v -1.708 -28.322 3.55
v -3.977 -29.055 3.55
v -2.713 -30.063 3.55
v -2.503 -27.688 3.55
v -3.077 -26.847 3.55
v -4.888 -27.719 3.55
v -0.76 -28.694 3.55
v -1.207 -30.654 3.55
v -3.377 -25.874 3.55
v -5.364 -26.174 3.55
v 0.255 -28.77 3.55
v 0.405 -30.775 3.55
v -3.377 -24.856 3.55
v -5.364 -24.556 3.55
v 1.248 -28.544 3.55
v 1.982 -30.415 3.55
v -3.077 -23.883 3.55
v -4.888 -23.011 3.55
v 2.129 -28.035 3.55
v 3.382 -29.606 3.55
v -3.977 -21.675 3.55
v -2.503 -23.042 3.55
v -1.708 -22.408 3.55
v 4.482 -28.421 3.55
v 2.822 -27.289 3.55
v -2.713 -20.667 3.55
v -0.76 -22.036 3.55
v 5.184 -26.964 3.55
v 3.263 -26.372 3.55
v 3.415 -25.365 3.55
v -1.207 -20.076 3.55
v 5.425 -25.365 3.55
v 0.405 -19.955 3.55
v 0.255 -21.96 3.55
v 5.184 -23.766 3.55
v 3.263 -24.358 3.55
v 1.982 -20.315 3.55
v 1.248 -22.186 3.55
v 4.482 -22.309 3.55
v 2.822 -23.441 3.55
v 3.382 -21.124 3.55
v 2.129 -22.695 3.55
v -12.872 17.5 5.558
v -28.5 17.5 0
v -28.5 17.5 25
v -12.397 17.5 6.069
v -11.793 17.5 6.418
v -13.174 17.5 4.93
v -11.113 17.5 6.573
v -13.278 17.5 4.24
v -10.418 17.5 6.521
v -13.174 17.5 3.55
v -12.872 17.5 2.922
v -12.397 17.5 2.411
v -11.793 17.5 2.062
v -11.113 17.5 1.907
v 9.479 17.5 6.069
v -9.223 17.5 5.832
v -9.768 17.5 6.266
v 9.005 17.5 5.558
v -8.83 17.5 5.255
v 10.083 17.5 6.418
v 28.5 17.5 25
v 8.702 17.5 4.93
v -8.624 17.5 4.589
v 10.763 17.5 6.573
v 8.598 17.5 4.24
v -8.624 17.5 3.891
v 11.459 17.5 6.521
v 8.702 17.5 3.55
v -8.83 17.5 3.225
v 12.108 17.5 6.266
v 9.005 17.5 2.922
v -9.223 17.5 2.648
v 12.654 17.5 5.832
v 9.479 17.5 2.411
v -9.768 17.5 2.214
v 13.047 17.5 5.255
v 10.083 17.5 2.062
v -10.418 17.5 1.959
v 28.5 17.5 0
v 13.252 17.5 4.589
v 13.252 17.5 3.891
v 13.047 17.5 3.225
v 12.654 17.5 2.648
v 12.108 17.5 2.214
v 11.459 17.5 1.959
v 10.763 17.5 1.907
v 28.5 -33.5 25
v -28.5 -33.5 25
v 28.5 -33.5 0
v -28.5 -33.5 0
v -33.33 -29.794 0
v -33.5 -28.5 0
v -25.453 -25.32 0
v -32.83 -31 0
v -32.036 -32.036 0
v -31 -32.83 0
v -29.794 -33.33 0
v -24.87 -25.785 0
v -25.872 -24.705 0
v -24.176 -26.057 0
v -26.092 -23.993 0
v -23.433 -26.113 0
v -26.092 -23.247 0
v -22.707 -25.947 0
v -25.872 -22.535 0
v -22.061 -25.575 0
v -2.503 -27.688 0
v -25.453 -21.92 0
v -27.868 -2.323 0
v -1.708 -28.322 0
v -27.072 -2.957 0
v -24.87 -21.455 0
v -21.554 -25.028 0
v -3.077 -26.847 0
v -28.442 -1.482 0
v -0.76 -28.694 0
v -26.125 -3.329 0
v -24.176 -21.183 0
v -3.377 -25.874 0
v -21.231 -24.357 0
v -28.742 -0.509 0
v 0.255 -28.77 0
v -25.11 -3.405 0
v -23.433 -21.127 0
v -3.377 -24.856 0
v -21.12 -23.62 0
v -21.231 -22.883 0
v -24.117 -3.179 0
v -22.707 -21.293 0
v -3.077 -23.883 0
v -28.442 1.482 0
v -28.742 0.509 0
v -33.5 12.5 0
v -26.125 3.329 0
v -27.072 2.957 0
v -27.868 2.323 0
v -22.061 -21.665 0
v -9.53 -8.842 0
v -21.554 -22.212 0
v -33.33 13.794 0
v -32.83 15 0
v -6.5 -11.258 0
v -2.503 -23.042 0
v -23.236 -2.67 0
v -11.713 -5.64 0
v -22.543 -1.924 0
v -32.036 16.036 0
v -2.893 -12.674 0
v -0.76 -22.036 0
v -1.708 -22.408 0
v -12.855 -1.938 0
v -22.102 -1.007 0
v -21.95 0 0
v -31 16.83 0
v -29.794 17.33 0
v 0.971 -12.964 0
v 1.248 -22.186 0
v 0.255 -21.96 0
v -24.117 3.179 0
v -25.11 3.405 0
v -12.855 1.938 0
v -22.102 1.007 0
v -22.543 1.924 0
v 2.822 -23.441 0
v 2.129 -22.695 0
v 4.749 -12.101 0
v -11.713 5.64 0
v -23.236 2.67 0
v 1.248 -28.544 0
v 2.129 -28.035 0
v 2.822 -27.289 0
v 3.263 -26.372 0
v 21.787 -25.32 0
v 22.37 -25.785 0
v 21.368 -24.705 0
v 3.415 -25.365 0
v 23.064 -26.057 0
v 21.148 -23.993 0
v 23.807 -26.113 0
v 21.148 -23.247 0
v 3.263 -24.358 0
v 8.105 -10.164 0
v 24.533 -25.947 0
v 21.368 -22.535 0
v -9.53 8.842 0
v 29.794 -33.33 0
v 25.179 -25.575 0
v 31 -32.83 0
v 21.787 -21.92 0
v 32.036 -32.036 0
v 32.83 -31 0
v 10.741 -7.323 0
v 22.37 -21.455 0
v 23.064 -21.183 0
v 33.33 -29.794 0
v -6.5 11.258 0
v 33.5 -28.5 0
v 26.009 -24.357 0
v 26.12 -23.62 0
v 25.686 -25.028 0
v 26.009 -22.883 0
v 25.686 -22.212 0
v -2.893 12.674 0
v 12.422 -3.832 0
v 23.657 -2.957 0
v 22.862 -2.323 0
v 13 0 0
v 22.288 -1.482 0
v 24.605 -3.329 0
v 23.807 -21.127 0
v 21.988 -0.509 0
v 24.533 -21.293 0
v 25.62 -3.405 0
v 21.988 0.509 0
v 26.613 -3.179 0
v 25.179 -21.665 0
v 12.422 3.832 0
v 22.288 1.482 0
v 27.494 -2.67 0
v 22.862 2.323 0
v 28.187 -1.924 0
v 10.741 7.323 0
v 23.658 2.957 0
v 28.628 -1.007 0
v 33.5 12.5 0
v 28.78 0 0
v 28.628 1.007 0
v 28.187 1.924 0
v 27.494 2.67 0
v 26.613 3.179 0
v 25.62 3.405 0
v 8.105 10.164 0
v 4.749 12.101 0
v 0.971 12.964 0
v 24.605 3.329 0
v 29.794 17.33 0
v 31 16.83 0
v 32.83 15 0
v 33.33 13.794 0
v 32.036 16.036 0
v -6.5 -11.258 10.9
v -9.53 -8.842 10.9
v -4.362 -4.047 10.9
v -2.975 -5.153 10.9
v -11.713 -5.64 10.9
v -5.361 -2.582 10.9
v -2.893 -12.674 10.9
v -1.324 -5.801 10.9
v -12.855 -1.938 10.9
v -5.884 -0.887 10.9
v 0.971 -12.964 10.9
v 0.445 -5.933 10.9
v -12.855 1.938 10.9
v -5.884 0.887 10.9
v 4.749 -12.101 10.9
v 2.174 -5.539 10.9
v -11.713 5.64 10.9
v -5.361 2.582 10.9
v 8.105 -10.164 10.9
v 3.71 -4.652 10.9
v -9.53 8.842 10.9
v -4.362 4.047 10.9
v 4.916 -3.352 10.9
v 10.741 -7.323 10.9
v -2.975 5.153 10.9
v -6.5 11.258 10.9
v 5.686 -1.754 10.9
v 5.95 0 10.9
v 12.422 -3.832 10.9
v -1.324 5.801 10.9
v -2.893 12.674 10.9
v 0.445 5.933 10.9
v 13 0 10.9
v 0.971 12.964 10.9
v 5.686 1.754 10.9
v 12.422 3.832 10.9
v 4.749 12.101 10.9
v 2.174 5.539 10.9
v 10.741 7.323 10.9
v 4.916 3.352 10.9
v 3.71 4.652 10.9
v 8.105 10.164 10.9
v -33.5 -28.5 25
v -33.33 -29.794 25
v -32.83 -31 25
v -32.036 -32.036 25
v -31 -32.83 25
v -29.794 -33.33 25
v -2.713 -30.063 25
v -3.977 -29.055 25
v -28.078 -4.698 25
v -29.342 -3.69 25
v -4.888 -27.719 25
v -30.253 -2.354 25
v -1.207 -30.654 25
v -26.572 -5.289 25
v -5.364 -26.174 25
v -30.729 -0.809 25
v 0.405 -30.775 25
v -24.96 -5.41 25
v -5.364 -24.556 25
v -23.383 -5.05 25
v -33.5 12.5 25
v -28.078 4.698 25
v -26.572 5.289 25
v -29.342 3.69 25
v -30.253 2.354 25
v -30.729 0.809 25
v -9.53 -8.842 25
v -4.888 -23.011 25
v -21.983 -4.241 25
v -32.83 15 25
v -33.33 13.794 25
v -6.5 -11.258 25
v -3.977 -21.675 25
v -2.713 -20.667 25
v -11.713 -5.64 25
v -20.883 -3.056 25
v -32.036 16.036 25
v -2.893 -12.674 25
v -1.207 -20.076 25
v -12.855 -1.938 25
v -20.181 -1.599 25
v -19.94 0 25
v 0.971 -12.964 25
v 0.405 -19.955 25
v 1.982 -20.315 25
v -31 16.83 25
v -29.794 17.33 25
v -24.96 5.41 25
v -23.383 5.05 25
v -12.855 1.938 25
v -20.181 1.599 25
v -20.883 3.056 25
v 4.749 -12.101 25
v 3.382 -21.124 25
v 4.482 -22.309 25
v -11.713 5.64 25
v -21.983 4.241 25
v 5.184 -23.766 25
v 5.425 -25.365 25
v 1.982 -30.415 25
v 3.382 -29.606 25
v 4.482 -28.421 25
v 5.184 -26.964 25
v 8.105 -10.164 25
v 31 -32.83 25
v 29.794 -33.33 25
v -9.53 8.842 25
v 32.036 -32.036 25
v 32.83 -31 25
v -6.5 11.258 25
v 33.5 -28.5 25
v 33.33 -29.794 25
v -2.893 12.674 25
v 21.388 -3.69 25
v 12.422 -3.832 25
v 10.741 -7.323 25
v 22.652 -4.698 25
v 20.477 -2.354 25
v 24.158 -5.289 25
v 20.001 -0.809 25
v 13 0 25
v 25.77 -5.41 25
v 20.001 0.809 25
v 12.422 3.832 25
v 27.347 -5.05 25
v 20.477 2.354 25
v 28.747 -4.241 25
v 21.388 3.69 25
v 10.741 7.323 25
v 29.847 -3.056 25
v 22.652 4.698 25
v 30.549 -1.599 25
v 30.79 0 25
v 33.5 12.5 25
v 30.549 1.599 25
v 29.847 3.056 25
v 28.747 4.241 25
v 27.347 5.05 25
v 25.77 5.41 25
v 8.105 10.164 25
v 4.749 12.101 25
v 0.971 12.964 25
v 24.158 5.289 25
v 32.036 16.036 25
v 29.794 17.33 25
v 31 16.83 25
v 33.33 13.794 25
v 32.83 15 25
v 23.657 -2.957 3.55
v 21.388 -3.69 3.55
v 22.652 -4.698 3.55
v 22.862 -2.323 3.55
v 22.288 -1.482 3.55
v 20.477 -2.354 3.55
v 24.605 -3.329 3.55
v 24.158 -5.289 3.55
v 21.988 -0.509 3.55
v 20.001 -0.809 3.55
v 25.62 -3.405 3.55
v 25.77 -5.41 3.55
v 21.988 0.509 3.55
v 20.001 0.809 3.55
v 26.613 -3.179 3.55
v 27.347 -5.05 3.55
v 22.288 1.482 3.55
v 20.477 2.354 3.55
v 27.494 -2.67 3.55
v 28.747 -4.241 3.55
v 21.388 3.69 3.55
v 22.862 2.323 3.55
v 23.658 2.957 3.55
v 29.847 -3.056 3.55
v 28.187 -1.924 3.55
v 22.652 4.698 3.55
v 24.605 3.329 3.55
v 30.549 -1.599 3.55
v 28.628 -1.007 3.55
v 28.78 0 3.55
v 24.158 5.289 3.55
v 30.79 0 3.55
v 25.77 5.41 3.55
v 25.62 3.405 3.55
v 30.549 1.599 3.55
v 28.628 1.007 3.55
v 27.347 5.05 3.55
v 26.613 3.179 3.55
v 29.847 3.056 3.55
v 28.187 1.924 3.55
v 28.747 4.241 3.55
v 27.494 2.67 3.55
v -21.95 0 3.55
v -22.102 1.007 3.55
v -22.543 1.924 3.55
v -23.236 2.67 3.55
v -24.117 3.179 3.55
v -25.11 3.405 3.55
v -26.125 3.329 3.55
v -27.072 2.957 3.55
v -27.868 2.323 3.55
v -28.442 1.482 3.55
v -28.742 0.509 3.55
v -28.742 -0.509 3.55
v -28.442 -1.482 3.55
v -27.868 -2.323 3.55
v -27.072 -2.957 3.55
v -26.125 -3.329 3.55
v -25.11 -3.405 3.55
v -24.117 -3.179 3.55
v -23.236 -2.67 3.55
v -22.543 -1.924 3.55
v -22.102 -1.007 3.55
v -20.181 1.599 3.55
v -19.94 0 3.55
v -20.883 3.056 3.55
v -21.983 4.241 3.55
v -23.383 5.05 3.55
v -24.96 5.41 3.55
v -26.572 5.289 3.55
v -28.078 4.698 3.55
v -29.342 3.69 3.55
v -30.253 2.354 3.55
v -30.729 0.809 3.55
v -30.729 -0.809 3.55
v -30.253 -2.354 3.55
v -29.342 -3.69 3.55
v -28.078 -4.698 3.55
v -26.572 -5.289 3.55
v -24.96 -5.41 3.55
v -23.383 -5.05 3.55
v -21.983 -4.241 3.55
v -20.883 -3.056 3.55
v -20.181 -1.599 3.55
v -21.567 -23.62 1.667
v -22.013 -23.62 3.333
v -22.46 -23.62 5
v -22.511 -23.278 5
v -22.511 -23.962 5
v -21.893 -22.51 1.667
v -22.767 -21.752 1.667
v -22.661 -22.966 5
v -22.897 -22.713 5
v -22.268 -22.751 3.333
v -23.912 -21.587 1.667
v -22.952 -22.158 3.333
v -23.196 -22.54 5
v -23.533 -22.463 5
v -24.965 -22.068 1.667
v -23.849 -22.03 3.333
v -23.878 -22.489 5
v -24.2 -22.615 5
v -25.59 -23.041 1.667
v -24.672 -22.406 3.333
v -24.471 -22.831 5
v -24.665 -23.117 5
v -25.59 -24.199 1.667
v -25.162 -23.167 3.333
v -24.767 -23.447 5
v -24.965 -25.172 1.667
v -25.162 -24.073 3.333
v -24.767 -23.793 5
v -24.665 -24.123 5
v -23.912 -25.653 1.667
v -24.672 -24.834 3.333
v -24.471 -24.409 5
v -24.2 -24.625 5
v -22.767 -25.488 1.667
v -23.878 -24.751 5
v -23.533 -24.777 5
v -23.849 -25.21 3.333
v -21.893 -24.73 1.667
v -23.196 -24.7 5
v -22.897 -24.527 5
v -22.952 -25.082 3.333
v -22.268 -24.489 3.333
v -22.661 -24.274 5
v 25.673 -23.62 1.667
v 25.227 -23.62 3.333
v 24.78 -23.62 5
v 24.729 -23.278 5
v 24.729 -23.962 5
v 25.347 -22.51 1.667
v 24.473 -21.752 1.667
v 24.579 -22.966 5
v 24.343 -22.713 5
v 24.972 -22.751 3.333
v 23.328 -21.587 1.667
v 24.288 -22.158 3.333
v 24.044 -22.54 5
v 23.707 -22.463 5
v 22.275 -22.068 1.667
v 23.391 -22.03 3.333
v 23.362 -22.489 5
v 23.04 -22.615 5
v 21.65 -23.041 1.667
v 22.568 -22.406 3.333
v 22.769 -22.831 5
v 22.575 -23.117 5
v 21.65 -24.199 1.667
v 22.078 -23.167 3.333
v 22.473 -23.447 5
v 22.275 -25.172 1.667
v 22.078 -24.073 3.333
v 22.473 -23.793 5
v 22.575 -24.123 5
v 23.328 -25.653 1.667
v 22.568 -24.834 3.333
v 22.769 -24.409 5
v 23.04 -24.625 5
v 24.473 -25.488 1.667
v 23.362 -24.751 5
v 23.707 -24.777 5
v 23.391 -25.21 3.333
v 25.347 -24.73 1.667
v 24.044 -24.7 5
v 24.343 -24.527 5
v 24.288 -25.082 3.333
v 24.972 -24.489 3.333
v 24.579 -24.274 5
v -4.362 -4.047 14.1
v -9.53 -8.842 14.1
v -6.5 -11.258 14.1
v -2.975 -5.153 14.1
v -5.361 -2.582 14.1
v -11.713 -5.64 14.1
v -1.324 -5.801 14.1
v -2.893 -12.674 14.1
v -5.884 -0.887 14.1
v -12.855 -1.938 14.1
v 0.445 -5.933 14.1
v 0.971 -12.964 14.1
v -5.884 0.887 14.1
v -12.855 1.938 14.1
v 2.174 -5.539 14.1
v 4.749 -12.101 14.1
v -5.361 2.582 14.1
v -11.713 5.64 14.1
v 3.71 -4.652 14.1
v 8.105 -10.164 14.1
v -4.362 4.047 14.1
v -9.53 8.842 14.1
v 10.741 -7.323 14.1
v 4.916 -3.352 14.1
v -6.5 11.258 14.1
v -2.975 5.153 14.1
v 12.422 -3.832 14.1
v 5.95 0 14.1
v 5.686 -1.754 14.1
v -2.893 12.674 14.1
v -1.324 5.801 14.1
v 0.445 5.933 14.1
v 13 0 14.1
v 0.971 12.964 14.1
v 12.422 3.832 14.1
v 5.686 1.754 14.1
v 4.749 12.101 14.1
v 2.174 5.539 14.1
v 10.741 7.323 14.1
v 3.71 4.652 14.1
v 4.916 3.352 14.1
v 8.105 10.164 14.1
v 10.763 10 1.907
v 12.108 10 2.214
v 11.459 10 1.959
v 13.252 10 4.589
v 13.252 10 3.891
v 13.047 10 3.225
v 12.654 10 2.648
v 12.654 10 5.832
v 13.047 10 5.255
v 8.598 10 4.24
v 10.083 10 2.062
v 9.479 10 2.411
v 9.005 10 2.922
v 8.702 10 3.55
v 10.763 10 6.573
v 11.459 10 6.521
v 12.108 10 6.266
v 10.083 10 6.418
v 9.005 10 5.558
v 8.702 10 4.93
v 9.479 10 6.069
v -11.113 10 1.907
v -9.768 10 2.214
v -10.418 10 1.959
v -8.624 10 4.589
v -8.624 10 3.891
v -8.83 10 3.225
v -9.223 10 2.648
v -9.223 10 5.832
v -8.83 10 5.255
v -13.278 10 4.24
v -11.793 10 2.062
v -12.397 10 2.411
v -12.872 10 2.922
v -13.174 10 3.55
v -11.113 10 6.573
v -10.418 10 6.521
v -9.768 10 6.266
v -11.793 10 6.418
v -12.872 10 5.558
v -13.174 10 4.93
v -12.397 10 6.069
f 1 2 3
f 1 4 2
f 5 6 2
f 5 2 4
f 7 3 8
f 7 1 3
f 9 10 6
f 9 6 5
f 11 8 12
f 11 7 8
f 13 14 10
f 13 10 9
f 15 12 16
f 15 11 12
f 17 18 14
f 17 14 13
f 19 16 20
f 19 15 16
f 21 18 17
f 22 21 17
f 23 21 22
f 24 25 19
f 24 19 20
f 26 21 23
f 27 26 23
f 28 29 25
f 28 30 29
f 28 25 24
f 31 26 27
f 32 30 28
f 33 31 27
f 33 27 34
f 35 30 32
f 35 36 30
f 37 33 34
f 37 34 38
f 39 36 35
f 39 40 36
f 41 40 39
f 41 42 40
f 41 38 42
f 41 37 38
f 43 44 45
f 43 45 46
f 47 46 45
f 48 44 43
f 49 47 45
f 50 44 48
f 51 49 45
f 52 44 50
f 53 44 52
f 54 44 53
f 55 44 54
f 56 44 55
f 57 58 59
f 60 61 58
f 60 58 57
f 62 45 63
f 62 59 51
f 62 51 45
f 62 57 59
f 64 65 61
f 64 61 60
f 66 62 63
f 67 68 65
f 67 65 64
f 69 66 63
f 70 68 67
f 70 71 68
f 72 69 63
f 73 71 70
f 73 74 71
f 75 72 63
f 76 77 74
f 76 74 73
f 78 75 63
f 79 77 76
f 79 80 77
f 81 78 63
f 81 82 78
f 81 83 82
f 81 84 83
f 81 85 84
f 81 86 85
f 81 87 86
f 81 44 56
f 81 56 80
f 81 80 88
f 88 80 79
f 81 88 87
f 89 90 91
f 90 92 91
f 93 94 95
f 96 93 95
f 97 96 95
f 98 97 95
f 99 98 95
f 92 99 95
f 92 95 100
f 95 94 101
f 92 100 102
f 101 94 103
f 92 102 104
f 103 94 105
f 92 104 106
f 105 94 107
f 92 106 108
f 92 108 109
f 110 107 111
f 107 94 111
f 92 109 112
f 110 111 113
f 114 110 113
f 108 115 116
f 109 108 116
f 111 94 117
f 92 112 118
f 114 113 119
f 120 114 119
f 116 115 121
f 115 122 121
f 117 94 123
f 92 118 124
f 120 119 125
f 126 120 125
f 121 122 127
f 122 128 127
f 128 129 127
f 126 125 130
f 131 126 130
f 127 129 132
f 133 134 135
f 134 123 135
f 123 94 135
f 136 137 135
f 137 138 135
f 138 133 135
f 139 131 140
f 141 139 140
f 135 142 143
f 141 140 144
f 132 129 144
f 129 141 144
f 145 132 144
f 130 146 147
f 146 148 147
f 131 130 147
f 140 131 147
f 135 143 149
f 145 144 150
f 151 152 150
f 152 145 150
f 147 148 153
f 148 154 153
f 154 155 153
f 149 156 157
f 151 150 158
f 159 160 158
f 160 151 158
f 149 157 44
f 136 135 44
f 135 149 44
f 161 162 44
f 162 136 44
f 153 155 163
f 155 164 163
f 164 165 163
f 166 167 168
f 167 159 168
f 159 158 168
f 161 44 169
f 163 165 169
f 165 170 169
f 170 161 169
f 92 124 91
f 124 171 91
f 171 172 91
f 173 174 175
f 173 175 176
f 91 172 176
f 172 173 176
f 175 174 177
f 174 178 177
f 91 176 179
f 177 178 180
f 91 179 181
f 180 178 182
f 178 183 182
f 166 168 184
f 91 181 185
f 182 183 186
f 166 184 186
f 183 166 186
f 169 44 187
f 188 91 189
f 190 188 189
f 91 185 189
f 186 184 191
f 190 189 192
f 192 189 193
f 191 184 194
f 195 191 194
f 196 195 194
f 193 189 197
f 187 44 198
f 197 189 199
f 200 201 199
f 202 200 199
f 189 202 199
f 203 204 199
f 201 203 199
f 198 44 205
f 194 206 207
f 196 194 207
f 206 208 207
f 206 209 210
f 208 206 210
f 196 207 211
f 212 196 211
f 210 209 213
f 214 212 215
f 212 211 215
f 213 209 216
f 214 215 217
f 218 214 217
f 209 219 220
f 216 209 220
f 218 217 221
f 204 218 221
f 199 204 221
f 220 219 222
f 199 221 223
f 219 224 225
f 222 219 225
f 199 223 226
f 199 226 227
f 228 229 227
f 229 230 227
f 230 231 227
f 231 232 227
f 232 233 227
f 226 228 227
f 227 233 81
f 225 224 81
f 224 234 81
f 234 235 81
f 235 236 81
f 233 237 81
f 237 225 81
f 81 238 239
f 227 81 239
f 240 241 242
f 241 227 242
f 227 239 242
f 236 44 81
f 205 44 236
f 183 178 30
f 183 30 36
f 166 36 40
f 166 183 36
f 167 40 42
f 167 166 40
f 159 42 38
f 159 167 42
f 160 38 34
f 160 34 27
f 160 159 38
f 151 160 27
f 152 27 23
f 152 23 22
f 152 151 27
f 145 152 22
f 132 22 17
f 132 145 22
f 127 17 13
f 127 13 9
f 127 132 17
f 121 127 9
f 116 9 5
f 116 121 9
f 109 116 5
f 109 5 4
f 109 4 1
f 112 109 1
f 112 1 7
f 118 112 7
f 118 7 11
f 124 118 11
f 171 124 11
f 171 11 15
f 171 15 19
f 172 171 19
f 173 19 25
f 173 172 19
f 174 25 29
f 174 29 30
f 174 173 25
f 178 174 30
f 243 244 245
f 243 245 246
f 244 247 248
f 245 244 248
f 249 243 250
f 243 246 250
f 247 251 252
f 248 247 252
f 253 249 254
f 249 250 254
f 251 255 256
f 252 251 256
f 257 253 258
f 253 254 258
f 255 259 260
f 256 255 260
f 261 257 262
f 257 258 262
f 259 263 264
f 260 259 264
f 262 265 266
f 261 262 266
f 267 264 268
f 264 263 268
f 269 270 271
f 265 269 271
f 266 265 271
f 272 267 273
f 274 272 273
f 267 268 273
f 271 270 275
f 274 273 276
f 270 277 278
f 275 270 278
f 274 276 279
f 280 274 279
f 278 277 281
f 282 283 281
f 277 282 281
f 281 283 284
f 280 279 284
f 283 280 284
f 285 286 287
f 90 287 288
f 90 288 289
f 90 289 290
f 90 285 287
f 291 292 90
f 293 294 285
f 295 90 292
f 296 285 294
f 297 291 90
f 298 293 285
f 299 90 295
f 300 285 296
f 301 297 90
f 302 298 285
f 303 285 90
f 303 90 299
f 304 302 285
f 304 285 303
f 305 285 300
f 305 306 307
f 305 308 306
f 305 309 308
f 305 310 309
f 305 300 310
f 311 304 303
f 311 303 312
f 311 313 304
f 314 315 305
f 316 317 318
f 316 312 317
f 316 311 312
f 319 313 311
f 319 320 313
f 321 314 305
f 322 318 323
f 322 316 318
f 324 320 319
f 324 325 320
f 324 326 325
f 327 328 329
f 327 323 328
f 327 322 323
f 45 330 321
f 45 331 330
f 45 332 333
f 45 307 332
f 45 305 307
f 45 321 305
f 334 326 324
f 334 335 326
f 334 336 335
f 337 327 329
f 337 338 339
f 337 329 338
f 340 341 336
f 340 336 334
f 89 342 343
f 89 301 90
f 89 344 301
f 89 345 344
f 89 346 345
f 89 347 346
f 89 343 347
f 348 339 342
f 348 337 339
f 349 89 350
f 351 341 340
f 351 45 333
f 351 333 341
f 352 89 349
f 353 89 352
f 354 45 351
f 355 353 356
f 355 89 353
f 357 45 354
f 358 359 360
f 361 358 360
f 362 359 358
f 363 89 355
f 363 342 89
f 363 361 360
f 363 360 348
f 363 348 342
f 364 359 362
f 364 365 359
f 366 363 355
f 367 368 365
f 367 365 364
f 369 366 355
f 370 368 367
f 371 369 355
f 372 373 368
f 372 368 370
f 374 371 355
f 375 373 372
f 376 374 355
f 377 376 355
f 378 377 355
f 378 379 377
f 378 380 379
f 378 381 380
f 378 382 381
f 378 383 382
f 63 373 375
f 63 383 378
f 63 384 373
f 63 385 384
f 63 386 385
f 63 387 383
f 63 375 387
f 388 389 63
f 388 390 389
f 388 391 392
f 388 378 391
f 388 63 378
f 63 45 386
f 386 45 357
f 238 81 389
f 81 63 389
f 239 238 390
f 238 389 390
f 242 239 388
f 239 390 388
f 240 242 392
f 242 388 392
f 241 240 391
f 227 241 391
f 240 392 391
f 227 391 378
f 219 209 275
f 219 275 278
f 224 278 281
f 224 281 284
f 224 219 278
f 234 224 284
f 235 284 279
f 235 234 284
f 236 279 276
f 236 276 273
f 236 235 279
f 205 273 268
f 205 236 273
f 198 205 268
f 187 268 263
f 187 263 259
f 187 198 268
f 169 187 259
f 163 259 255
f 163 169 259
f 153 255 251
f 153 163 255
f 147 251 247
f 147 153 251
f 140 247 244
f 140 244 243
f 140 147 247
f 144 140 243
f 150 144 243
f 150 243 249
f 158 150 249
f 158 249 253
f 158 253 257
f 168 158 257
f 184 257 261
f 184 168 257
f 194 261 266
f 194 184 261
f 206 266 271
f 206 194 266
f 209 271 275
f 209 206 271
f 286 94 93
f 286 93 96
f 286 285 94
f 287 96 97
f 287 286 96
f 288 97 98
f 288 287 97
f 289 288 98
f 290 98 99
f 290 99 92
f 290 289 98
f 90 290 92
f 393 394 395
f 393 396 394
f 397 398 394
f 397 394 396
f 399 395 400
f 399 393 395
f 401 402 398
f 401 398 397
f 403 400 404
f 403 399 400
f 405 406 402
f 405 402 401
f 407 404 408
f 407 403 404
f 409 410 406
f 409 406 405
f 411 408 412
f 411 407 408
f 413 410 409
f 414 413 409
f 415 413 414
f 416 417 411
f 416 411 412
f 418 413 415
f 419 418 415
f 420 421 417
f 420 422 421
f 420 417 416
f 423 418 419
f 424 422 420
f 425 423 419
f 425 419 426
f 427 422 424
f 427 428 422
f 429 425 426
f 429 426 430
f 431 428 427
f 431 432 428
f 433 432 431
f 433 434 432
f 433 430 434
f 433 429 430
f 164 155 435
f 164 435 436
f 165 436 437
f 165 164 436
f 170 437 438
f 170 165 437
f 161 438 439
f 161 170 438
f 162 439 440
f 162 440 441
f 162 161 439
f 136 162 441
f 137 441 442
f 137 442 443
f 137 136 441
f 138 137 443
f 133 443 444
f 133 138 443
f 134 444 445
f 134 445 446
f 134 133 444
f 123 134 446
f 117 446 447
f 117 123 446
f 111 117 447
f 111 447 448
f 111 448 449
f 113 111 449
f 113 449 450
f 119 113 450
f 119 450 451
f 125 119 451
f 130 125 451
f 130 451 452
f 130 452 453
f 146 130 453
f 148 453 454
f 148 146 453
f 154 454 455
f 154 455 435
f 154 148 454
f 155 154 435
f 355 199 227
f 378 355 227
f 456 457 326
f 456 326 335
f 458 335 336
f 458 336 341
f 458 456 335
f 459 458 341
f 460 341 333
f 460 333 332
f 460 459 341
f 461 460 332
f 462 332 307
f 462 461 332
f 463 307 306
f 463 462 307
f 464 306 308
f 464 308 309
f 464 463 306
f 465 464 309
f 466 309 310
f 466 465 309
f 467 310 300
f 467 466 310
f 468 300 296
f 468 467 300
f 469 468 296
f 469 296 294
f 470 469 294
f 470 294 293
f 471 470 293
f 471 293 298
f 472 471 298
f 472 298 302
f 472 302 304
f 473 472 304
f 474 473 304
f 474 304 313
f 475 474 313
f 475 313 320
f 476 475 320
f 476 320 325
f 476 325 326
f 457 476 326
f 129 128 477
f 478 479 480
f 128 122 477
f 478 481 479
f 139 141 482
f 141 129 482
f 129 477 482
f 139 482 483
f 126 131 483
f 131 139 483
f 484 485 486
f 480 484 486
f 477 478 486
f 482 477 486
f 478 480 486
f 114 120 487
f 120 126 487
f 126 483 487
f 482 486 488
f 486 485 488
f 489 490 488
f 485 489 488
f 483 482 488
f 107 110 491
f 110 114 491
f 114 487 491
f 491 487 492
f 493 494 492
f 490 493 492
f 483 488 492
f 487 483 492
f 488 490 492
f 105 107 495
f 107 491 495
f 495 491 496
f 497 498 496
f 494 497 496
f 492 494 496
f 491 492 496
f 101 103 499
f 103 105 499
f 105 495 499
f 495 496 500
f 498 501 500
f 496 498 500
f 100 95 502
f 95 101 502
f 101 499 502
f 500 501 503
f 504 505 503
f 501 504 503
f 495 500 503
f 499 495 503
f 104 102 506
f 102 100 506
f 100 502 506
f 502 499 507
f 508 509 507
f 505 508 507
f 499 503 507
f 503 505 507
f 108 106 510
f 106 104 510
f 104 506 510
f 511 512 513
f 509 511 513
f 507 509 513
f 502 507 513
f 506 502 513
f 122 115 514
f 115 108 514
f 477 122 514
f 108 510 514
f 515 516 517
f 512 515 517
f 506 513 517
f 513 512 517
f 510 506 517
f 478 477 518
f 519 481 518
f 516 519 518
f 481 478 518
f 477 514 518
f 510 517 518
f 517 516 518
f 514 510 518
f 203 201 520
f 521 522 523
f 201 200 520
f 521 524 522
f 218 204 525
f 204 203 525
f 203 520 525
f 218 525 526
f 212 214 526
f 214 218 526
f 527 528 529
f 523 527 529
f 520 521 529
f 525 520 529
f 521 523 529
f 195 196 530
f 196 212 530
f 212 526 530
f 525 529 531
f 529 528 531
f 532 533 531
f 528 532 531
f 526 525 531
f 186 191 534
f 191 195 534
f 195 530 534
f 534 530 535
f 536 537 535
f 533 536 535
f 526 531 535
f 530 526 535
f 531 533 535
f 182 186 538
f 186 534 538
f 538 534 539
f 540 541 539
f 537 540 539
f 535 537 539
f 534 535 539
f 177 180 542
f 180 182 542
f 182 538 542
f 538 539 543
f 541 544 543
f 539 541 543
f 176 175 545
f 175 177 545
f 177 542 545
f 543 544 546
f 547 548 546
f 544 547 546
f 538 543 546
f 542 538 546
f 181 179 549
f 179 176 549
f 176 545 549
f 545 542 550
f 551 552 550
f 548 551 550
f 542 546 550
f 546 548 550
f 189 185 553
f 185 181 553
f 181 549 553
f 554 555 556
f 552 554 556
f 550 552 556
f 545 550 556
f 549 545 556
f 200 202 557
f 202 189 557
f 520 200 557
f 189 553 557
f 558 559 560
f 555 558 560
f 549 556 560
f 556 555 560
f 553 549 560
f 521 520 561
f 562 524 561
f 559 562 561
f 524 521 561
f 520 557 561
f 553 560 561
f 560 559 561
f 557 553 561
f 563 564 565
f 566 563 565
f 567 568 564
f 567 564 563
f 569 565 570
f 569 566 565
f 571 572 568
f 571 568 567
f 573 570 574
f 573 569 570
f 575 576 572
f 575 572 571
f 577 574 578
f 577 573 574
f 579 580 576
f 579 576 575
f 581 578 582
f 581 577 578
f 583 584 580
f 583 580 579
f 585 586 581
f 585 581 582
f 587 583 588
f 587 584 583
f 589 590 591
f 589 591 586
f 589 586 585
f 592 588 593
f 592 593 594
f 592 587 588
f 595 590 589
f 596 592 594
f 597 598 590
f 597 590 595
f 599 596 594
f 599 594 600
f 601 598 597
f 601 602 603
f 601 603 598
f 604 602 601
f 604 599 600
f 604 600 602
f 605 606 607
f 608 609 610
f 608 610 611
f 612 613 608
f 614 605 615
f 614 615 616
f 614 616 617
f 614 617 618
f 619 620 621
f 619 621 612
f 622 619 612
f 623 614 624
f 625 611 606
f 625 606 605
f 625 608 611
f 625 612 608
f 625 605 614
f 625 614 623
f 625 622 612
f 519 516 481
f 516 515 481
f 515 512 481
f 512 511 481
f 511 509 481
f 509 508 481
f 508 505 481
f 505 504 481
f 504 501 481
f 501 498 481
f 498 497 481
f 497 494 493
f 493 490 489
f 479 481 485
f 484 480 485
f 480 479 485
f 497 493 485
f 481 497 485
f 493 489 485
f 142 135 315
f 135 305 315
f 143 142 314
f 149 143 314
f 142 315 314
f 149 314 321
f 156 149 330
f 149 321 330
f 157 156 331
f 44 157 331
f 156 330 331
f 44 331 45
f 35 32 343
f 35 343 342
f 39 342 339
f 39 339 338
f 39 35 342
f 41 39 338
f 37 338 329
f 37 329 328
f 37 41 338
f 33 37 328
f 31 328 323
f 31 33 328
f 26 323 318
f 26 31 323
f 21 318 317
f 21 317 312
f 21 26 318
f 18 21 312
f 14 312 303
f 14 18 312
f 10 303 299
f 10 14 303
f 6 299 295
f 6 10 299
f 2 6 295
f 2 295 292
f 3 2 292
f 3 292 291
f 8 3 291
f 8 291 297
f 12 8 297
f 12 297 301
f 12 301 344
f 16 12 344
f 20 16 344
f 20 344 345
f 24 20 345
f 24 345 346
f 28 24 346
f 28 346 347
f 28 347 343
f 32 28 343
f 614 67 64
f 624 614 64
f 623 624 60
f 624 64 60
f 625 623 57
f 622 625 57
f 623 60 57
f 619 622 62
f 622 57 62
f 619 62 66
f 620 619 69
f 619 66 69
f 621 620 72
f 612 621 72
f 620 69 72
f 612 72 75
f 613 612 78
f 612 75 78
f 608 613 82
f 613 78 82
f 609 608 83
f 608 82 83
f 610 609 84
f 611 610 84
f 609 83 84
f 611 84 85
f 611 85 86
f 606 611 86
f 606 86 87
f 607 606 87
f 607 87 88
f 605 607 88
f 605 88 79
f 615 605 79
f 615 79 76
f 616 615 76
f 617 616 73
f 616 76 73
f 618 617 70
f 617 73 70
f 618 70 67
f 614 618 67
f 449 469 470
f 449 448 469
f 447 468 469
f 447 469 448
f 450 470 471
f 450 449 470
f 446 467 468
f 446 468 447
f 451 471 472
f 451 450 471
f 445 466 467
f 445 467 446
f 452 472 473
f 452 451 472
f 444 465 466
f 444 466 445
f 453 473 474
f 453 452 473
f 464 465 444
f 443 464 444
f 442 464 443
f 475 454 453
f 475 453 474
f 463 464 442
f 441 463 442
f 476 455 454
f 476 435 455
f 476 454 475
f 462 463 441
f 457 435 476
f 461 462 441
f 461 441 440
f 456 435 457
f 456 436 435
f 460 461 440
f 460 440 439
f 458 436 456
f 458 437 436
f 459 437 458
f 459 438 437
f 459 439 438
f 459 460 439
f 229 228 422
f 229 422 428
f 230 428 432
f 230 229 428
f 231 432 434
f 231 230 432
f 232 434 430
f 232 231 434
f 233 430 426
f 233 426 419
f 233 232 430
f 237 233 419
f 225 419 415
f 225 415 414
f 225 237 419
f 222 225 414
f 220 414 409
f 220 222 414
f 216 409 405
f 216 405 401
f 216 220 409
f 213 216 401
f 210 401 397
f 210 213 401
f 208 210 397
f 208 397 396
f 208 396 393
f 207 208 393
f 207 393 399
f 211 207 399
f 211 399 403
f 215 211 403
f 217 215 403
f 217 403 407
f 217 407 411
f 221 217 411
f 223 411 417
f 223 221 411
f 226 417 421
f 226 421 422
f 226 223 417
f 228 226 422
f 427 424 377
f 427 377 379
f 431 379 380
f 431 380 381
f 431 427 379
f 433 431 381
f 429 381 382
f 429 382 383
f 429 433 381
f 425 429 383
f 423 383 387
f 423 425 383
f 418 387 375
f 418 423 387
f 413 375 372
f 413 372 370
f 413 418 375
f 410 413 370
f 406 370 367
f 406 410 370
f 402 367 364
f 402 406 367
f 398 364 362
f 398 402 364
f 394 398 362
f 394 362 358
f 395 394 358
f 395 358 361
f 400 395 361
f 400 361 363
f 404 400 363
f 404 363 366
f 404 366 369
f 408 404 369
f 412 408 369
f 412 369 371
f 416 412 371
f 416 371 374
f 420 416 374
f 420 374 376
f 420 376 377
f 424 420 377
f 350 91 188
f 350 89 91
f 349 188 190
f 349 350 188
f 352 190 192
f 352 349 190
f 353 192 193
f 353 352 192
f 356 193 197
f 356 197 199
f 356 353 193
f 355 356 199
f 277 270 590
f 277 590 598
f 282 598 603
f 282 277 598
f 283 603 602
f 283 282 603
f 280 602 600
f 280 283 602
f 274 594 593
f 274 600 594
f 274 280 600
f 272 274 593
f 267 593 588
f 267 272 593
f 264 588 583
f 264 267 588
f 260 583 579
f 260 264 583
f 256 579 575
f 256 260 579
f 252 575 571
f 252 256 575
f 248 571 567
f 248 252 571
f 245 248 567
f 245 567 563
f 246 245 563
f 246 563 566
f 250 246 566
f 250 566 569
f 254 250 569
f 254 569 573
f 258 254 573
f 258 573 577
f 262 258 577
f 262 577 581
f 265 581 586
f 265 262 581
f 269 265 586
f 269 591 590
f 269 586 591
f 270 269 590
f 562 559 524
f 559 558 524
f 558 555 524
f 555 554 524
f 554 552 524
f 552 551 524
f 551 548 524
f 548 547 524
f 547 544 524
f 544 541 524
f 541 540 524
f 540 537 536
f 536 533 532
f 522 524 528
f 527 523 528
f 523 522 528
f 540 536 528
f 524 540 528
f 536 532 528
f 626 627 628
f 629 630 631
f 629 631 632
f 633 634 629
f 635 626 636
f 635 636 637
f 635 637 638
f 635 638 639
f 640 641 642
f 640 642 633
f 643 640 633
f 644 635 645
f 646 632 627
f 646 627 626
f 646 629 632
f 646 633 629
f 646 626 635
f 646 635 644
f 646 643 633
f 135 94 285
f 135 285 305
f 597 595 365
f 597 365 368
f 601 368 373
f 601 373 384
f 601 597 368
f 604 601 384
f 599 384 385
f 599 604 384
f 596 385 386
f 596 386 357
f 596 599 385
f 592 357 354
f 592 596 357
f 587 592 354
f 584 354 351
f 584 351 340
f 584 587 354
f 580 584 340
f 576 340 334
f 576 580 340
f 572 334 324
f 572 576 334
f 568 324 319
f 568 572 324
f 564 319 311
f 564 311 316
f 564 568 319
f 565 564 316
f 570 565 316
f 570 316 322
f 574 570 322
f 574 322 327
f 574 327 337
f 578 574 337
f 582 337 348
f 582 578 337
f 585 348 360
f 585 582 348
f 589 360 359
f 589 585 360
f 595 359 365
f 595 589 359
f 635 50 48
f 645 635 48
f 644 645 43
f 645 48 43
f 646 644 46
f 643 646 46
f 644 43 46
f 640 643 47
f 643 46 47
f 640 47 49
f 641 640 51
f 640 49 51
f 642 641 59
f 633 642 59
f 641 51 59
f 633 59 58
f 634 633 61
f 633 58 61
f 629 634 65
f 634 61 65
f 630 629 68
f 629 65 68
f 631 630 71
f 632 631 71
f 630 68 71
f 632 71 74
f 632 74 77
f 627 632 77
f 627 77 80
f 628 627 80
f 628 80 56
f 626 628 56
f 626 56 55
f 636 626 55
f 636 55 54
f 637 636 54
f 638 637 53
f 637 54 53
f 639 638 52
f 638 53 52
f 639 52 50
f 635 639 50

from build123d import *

# Parameters (mm, degrees)
F0_W      = 29.9564684167
F0_H      = 51
F0_R      = 5.425
F0_R_2    = 5.95
F1_DEPTH  = 25
F0_W_2    = 18.5217657917
F2_DEPTH  = 25
F0_R_3    = 3.415
F3_DEPTH  = 3.55
F4_R      = 2.34
F5_DEPTH  = 7.5
F7_START  = 14.1
F6_R      = 13
F7_DEPTH  = 10.9
F8_DEPTH  = 10.9
F9_R      = 2.5
F10_DEPTH = 5
F10_TAPER = 15
F11_R     = 5


with BuildPart() as f1:
    # F0 (on Top) → F1 (new body)
    with BuildSketch(Plane.XY):
        with Locations((0, -8)):
            Rectangle(F0_W, F0_H)
        with Locations((0, -25.365)):
            Circle(F0_R, mode=Mode.SUBTRACT)
        Circle(F0_R_2, mode=Mode.SUBTRACT)
    extrude(amount=F1_DEPTH)

    # F0 (on Top) → F2 (join)
    with BuildSketch(Plane.XY):
        with Locations((-24.2391171042, -8)):
            Rectangle(F0_W_2, F0_H)
        with Locations((-25.365, 0)):
            Circle(F0_R, mode=Mode.SUBTRACT)
        with Locations((24.2391171042, -8)):
            Rectangle(F0_W_2, F0_H)
        with Locations((25.365, 0)):
            Circle(F0_R, mode=Mode.SUBTRACT)
    extrude(amount=F2_DEPTH)

    # F0 (on Top) → F3 (join)
    with BuildSketch(Plane.XY):
        with Locations((-25.365, 0)):
            Circle(F0_R)
        with Locations((-25.365, 0)):
            Circle(F0_R_3, mode=Mode.SUBTRACT)
        with Locations((25.365, 0)):
            Circle(F0_R)
        with Locations((25.365, 0)):
            Circle(F0_R_3, mode=Mode.SUBTRACT)
        with Locations((0, -25.365)):
            Circle(F0_R)
        with Locations((0, -25.365)):
            Circle(F0_R_3, mode=Mode.SUBTRACT)
    extrude(amount=F3_DEPTH)

    # F4 (on face) → F5 (cut)
    with BuildSketch(Plane(origin=(0, 17.5, 0), x_dir=(-1, 0, 0), z_dir=(0, 1, 0))):
        with Locations((-10.9382342083, 4.24)):
            Circle(F4_R)
        with Locations((10.9382342083, 4.24)):
            Circle(F4_R)
    extrude(amount=-F5_DEPTH, mode=Mode.SUBTRACT)

    # F6 (on Top) → F7 (cut)
    with BuildSketch(Plane.XY.offset(F7_START)):
        Circle(F6_R)
    extrude(amount=F7_DEPTH, mode=Mode.SUBTRACT)

    # F6 (on Top) → F8 (cut)
    with BuildSketch(Plane.XY):
        Circle(F6_R)
    extrude(amount=F8_DEPTH, mode=Mode.SUBTRACT)

    # F9 (on Top) → F10 (cut)
    with BuildSketch(Plane.XY):
        with Locations((23.62, -23.62)):
            Circle(F9_R)
        with Locations((-23.62, -23.62)):
            Circle(F9_R)
    extrude(amount=F10_DEPTH, taper=F10_TAPER, mode=Mode.SUBTRACT)

    # F11
    f11_edges = [f1.edges().sort_by_distance(p)[0] for p in [
        (33.5, -33.5, 12.5),
        (-33.5, -33.5, 12.5),
        (-33.5, 17.5, 12.5),
        (33.5, 17.5, 12.5),
    ]]
    fillet(f11_edges, radius=F11_R)


solid = f1.part
